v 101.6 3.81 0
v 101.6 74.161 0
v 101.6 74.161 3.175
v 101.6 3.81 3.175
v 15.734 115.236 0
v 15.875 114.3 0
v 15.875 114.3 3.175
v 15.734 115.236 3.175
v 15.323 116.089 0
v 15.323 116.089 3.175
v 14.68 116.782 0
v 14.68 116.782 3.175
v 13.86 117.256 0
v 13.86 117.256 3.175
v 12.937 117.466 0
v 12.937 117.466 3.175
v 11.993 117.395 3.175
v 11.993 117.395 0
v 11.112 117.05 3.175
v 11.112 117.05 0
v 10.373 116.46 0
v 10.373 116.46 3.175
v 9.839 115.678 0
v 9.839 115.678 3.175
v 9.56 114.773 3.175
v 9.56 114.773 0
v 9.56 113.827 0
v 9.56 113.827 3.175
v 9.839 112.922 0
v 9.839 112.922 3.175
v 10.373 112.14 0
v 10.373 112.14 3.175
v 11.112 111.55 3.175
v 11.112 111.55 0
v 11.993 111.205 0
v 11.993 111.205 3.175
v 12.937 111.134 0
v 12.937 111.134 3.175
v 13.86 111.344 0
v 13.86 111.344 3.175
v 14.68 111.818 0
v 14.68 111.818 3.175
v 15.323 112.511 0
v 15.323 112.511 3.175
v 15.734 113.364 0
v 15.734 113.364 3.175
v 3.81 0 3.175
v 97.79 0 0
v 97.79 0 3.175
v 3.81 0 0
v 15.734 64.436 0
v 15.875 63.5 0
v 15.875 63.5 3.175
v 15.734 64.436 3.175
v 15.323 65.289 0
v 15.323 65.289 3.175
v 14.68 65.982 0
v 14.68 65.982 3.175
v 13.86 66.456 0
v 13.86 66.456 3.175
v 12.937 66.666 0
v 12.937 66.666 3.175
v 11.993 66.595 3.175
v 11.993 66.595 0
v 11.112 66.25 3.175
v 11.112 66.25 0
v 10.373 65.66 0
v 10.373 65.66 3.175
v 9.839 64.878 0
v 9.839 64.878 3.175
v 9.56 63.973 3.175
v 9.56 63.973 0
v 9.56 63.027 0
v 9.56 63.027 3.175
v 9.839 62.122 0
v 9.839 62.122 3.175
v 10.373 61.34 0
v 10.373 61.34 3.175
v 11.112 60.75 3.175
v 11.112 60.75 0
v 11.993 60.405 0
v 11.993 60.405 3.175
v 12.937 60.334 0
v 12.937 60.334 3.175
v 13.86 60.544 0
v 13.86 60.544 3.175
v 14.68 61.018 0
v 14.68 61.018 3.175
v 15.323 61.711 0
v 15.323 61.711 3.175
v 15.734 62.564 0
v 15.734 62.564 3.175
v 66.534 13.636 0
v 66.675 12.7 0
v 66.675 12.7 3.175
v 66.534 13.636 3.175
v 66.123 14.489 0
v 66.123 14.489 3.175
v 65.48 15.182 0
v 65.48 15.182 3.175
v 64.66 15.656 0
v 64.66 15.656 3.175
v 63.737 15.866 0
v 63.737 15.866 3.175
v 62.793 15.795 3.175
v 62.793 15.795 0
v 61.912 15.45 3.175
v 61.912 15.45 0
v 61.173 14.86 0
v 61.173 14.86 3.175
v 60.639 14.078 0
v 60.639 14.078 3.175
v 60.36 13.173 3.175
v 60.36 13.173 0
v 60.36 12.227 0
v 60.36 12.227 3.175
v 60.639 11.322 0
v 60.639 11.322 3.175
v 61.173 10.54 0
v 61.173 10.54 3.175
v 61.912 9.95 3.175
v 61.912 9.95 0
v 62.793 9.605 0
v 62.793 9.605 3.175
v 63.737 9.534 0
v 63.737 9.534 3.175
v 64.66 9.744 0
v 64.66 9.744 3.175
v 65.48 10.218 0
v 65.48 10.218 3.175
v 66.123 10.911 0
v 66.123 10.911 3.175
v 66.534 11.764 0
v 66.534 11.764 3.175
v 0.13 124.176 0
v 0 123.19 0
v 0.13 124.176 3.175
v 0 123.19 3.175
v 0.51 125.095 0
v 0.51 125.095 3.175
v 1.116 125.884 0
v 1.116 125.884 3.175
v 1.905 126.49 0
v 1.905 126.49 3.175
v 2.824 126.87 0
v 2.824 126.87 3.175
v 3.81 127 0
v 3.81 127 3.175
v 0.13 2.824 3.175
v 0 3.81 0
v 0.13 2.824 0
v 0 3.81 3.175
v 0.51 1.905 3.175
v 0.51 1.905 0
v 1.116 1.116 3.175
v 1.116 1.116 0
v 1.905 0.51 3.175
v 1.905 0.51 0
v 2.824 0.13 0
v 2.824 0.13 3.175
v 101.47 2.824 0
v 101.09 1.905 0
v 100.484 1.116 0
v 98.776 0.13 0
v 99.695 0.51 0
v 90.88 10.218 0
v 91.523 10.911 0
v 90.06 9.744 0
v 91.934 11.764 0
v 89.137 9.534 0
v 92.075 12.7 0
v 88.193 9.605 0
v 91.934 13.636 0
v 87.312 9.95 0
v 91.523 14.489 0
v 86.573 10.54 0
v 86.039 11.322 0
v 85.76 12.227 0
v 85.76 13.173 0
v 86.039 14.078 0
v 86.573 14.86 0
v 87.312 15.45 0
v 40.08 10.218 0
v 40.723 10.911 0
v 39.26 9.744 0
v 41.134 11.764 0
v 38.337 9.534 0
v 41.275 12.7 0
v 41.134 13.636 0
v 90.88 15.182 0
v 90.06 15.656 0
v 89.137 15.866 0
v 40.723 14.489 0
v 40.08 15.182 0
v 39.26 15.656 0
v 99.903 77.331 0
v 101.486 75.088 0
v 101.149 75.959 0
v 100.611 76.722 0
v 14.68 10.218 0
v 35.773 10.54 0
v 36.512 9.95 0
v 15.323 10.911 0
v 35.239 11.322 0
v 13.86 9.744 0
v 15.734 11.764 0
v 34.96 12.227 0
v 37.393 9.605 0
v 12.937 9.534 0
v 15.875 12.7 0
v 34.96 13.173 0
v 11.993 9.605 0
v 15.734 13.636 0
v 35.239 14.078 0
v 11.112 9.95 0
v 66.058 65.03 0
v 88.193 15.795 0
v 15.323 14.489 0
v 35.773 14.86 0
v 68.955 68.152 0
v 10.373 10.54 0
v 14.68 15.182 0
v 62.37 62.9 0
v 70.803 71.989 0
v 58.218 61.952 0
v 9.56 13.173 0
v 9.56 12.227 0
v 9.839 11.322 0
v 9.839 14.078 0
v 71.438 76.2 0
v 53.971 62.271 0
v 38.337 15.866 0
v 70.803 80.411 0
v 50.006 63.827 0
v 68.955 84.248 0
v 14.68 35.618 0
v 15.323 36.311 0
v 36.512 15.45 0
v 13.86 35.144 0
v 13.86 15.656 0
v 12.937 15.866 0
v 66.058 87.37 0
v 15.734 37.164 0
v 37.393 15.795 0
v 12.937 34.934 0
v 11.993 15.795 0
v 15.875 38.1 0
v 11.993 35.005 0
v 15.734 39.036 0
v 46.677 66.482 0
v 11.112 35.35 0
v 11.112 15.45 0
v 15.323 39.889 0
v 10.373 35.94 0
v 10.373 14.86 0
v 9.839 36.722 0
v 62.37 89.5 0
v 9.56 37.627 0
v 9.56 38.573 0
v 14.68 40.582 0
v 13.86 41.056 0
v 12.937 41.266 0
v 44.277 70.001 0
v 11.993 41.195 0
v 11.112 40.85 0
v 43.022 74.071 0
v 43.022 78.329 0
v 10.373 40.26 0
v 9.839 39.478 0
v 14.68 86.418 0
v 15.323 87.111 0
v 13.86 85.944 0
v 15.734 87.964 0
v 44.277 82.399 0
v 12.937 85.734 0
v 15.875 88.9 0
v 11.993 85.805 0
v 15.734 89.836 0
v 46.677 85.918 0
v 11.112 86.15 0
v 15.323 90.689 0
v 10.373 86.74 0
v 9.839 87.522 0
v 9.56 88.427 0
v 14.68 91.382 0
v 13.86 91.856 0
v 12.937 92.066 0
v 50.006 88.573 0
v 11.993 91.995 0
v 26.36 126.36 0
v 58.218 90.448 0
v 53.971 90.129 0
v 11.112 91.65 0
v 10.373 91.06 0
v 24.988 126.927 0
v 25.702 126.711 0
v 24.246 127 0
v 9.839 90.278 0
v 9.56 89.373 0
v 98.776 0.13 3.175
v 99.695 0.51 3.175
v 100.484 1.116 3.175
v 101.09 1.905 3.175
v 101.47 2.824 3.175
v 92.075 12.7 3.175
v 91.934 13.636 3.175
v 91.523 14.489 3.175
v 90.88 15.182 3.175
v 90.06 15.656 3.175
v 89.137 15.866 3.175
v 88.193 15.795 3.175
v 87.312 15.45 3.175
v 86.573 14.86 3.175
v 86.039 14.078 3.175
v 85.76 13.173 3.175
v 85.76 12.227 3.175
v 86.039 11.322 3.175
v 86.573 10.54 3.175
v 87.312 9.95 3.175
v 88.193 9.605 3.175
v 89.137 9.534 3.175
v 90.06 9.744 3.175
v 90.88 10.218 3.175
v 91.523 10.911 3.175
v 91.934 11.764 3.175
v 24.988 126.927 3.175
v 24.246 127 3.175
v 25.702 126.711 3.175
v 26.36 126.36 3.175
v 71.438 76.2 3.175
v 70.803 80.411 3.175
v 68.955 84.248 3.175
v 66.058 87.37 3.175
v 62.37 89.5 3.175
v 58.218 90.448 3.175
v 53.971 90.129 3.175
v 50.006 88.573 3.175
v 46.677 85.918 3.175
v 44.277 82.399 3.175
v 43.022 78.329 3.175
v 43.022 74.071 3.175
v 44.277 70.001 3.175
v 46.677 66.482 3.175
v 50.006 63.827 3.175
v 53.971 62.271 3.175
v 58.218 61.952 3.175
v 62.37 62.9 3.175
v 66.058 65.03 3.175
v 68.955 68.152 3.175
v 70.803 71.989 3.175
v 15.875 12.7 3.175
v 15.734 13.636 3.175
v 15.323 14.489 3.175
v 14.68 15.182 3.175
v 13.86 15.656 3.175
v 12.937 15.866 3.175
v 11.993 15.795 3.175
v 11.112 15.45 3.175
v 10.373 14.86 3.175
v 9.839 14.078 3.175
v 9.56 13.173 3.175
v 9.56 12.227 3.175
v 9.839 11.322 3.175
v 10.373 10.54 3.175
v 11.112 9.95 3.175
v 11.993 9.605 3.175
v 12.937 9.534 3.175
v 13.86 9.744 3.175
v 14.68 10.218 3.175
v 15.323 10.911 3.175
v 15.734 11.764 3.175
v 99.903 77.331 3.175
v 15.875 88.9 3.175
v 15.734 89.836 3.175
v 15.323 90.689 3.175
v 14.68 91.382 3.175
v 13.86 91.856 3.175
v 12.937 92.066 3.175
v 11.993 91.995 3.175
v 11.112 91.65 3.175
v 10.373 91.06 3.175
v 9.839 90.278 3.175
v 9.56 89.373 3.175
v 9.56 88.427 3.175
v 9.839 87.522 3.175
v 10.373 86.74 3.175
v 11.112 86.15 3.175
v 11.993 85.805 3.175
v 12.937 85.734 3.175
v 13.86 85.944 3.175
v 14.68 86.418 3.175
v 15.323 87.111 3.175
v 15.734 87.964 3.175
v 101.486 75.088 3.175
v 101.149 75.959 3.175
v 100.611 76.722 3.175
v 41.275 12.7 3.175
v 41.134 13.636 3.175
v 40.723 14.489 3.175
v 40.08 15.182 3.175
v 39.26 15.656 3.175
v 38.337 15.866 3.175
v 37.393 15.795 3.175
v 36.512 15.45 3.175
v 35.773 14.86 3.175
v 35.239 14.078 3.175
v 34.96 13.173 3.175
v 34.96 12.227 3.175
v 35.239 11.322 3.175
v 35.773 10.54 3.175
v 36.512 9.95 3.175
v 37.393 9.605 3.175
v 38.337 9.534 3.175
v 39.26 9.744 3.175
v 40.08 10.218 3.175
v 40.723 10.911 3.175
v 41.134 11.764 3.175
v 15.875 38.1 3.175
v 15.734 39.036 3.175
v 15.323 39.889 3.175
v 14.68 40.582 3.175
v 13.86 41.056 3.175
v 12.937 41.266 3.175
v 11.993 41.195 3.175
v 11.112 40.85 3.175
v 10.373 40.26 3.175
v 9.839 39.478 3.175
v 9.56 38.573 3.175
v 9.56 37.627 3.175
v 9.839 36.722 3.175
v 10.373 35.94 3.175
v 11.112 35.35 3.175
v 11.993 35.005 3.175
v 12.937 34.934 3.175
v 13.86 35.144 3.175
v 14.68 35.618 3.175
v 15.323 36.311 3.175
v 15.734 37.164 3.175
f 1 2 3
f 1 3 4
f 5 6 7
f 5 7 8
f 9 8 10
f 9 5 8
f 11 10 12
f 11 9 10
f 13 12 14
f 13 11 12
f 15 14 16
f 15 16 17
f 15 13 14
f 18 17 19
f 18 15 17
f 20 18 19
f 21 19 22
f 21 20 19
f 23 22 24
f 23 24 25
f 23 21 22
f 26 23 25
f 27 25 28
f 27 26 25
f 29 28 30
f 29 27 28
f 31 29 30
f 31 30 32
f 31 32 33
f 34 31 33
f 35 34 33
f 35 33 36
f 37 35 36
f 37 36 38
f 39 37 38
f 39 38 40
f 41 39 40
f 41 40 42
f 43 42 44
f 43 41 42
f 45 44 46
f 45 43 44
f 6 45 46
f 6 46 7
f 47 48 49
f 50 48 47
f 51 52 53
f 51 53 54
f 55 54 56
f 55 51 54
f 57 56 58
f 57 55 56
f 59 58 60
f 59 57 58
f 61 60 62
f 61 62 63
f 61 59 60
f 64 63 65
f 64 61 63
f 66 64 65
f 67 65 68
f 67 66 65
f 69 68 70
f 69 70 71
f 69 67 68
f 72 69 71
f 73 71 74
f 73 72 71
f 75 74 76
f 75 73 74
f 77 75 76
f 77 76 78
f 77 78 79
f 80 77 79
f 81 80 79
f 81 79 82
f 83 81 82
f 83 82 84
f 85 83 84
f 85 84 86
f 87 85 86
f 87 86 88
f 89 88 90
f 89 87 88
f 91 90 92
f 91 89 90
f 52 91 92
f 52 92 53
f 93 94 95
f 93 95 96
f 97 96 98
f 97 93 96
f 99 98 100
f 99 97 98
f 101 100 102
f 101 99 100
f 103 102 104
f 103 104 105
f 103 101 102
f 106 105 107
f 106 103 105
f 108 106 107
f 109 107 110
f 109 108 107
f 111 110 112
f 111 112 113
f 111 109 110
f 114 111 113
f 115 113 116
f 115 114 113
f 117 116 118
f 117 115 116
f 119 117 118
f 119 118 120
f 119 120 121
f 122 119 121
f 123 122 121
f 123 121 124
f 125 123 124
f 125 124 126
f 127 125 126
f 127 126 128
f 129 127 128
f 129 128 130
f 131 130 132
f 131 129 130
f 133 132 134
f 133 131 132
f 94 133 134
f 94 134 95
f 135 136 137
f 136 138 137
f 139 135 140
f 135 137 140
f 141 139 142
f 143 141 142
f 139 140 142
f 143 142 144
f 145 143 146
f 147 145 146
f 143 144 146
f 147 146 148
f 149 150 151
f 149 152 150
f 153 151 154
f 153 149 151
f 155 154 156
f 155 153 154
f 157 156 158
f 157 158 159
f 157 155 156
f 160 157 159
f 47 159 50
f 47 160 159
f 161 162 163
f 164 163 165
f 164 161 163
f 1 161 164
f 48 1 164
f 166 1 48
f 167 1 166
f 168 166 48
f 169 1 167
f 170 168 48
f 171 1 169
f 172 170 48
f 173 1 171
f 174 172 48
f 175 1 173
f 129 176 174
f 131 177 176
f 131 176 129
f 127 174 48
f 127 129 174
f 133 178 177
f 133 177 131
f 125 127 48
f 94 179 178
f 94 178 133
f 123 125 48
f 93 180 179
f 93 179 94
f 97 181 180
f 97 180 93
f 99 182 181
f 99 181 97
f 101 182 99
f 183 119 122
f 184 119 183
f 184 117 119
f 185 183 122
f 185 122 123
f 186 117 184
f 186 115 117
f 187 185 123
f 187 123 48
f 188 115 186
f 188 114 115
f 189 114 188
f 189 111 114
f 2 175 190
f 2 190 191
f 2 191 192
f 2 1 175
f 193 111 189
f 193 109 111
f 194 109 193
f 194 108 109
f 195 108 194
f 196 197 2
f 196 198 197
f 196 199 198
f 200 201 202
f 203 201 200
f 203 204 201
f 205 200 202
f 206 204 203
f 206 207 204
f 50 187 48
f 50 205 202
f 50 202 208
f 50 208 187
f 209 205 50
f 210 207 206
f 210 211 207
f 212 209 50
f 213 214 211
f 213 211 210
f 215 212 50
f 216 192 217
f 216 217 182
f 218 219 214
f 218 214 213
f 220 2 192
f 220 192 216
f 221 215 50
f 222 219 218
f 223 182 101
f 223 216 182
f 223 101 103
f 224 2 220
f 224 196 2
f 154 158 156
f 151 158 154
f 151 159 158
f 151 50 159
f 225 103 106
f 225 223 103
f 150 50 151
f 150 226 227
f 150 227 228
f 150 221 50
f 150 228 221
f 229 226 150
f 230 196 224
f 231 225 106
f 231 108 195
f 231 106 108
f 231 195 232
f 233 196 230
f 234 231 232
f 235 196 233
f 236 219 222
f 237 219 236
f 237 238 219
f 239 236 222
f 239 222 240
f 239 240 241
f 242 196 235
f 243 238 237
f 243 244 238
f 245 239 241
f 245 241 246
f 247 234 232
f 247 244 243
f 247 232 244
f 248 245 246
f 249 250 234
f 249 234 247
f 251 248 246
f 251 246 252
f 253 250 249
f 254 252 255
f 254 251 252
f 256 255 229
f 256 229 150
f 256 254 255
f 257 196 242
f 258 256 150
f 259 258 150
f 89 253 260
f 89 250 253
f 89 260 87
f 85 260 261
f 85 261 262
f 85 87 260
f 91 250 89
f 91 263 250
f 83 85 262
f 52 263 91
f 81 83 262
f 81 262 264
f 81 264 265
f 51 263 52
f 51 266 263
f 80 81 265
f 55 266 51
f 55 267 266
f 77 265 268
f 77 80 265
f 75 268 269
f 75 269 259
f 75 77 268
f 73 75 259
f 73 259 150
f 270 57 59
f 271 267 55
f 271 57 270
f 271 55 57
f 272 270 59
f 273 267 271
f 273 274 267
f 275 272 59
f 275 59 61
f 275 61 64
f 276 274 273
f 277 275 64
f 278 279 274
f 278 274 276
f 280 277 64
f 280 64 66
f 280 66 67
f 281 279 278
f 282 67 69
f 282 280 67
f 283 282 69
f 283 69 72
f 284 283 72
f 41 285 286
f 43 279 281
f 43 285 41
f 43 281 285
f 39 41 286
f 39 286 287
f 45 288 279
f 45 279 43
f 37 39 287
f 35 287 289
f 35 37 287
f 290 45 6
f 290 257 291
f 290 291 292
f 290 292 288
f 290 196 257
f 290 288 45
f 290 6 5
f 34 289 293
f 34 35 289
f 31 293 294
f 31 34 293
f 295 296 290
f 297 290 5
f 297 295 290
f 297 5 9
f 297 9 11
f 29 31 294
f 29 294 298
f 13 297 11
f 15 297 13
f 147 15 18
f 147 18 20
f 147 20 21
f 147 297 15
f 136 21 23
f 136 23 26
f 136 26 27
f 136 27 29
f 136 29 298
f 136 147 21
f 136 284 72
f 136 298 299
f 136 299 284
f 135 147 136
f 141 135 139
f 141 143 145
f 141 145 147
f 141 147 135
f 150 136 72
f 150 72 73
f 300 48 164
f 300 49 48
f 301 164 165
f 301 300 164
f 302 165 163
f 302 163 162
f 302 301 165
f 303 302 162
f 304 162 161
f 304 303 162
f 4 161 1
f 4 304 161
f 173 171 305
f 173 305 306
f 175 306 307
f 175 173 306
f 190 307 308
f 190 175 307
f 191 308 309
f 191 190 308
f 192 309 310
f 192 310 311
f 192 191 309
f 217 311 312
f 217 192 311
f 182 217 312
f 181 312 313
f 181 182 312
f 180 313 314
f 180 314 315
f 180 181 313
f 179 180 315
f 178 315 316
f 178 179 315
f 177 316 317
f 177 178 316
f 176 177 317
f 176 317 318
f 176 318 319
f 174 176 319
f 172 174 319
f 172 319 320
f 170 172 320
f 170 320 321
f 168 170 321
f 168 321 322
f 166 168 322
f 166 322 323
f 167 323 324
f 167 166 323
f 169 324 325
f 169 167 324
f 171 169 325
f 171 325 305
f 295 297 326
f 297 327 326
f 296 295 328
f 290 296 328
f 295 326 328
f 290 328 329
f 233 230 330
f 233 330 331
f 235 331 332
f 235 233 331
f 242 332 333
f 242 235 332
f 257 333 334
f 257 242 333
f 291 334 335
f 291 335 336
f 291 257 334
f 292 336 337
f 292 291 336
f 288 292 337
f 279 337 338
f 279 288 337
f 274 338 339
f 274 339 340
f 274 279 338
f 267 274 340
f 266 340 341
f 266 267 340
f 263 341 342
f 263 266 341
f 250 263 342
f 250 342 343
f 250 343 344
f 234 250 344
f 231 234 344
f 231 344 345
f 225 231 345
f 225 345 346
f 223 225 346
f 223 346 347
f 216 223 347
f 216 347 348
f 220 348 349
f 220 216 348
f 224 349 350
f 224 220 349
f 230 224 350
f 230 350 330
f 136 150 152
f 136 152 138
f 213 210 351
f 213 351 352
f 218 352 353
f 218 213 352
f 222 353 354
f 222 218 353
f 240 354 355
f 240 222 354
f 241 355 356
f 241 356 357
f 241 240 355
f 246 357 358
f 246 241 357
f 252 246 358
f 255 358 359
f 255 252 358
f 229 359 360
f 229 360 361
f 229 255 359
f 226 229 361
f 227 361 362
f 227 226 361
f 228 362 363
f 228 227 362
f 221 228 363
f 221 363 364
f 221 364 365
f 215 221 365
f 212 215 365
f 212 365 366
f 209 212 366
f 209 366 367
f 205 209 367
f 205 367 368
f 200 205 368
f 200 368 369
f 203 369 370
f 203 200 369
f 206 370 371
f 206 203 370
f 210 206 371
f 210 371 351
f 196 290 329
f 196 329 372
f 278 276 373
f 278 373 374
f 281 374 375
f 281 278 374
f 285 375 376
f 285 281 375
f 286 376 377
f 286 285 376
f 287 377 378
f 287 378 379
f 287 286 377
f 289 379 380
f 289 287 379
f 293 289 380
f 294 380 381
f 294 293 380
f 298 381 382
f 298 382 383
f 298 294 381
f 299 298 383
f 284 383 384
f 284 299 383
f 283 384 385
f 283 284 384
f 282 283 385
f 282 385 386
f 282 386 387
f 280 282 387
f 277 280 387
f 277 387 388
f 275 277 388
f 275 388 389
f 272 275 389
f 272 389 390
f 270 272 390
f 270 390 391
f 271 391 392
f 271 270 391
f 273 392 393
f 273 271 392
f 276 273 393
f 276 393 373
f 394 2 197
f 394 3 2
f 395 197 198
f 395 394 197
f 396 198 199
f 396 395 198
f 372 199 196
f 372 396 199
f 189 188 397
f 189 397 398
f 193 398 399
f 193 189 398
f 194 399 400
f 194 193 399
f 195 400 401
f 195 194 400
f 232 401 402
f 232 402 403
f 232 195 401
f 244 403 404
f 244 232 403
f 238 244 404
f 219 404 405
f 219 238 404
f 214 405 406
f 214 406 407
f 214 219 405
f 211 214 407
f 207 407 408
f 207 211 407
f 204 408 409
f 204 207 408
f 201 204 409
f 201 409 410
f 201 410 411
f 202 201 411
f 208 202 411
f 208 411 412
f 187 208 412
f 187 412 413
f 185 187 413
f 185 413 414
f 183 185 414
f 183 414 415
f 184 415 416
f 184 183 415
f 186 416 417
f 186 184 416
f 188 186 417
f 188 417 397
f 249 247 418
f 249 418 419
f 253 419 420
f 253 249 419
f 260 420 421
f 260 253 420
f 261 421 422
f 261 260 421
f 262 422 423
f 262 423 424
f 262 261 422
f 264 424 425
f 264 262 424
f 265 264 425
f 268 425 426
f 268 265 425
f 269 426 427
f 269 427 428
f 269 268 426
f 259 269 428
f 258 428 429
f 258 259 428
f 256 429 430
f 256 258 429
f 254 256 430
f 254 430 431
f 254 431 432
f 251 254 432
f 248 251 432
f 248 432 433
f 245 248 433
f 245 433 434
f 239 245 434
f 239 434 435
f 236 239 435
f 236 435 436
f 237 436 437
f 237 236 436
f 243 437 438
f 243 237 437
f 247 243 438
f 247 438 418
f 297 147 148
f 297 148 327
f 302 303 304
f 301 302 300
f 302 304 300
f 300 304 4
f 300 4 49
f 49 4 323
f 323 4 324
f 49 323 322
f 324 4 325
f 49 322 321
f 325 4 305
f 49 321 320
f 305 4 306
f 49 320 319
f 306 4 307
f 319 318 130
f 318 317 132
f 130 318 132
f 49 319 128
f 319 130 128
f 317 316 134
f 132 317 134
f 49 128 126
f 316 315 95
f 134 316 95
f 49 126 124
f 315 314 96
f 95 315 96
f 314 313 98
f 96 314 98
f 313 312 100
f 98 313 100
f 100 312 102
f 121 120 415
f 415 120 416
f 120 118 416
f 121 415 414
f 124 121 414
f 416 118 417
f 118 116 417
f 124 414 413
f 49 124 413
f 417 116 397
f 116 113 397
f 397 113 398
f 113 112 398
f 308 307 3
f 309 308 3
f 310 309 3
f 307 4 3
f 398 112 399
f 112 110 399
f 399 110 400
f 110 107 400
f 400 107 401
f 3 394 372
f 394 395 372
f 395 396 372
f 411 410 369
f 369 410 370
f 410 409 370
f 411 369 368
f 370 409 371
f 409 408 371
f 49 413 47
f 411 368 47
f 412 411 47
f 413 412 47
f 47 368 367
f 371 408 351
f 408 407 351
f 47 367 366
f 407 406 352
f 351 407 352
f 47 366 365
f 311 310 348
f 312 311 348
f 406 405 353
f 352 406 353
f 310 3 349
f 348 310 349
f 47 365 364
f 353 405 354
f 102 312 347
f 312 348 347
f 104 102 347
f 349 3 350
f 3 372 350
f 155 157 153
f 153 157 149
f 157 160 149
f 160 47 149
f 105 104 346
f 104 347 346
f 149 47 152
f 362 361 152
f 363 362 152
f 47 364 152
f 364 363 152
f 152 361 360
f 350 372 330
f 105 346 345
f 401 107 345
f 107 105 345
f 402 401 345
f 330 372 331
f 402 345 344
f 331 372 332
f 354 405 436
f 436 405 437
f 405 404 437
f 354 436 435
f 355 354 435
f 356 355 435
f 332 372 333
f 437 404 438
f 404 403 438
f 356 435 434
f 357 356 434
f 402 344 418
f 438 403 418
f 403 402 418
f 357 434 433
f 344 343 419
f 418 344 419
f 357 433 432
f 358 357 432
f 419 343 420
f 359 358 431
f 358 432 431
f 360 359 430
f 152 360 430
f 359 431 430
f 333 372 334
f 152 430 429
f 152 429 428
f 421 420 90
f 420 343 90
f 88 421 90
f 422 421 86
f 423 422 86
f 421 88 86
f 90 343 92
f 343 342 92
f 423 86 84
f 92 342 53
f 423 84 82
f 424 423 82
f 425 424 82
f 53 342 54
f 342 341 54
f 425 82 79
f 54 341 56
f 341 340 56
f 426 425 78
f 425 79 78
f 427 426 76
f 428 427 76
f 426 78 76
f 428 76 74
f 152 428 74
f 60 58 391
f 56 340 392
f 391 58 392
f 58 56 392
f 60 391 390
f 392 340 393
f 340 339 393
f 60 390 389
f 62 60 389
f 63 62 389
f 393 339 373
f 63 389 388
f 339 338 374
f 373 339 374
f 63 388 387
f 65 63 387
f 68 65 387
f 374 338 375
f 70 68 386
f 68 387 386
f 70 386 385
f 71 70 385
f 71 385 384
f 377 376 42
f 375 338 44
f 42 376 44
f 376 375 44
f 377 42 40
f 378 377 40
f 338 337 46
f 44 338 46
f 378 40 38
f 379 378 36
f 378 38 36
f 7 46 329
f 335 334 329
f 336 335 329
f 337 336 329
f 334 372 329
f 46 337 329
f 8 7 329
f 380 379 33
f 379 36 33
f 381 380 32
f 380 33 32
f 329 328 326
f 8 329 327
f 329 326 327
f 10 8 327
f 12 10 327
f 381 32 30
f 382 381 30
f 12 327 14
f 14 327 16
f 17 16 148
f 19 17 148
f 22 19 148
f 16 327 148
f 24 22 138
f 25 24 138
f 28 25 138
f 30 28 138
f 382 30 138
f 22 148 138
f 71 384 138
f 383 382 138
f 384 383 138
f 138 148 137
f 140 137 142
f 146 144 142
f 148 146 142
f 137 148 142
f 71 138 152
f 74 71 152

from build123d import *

# Parameters (mm, degrees)
SKETCH1_R           = 14.2875
SKETCH1_R_2         = 3.175
BOSS_EXTRUDE1_DEPTH = 3.175
FILLET1_R           = 3.81


with BuildPart() as part:
    # Sketch1 → Boss-Extrude1 (new body)
    with BuildSketch(Plane.XY):
        Polygon((0, 0), (0, 127), (25.4, 127), (101.6, 76.2), (101.6, 0), align=None)
        with Locations((57.15, 76.2)):
            Circle(SKETCH1_R, mode=Mode.SUBTRACT)
        with Locations((12.7, 12.7)):
            Circle(SKETCH1_R_2, mode=Mode.SUBTRACT)
        with Locations((38.1, 12.7)):
            Circle(SKETCH1_R_2, mode=Mode.SUBTRACT)
        with Locations((63.5, 12.7)):
            Circle(SKETCH1_R_2, mode=Mode.SUBTRACT)
        with Locations((88.9, 12.7)):
            Circle(SKETCH1_R_2, mode=Mode.SUBTRACT)
        with Locations((12.7, 38.1)):
            Circle(SKETCH1_R_2, mode=Mode.SUBTRACT)
        with Locations((12.7, 63.5)):
            Circle(SKETCH1_R_2, mode=Mode.SUBTRACT)
        with Locations((12.7, 88.9)):
            Circle(SKETCH1_R_2, mode=Mode.SUBTRACT)
        with Locations((12.7, 114.3)):
            Circle(SKETCH1_R_2, mode=Mode.SUBTRACT)
    extrude(amount=BOSS_EXTRUDE1_DEPTH)

    # Fillet1
    fillet1_edges = [part.edges().sort_by_distance(p)[0] for p in [
        (0, 0, 1.5875),
        (0, 127, 1.5875),
        (25.4, 127, 1.5875),
        (101.6, 76.2, 1.5875),
        (101.6, 0, 1.5875),
    ]]
    fillet(fillet1_edges, radius=FILLET1_R)


solid = part.part
